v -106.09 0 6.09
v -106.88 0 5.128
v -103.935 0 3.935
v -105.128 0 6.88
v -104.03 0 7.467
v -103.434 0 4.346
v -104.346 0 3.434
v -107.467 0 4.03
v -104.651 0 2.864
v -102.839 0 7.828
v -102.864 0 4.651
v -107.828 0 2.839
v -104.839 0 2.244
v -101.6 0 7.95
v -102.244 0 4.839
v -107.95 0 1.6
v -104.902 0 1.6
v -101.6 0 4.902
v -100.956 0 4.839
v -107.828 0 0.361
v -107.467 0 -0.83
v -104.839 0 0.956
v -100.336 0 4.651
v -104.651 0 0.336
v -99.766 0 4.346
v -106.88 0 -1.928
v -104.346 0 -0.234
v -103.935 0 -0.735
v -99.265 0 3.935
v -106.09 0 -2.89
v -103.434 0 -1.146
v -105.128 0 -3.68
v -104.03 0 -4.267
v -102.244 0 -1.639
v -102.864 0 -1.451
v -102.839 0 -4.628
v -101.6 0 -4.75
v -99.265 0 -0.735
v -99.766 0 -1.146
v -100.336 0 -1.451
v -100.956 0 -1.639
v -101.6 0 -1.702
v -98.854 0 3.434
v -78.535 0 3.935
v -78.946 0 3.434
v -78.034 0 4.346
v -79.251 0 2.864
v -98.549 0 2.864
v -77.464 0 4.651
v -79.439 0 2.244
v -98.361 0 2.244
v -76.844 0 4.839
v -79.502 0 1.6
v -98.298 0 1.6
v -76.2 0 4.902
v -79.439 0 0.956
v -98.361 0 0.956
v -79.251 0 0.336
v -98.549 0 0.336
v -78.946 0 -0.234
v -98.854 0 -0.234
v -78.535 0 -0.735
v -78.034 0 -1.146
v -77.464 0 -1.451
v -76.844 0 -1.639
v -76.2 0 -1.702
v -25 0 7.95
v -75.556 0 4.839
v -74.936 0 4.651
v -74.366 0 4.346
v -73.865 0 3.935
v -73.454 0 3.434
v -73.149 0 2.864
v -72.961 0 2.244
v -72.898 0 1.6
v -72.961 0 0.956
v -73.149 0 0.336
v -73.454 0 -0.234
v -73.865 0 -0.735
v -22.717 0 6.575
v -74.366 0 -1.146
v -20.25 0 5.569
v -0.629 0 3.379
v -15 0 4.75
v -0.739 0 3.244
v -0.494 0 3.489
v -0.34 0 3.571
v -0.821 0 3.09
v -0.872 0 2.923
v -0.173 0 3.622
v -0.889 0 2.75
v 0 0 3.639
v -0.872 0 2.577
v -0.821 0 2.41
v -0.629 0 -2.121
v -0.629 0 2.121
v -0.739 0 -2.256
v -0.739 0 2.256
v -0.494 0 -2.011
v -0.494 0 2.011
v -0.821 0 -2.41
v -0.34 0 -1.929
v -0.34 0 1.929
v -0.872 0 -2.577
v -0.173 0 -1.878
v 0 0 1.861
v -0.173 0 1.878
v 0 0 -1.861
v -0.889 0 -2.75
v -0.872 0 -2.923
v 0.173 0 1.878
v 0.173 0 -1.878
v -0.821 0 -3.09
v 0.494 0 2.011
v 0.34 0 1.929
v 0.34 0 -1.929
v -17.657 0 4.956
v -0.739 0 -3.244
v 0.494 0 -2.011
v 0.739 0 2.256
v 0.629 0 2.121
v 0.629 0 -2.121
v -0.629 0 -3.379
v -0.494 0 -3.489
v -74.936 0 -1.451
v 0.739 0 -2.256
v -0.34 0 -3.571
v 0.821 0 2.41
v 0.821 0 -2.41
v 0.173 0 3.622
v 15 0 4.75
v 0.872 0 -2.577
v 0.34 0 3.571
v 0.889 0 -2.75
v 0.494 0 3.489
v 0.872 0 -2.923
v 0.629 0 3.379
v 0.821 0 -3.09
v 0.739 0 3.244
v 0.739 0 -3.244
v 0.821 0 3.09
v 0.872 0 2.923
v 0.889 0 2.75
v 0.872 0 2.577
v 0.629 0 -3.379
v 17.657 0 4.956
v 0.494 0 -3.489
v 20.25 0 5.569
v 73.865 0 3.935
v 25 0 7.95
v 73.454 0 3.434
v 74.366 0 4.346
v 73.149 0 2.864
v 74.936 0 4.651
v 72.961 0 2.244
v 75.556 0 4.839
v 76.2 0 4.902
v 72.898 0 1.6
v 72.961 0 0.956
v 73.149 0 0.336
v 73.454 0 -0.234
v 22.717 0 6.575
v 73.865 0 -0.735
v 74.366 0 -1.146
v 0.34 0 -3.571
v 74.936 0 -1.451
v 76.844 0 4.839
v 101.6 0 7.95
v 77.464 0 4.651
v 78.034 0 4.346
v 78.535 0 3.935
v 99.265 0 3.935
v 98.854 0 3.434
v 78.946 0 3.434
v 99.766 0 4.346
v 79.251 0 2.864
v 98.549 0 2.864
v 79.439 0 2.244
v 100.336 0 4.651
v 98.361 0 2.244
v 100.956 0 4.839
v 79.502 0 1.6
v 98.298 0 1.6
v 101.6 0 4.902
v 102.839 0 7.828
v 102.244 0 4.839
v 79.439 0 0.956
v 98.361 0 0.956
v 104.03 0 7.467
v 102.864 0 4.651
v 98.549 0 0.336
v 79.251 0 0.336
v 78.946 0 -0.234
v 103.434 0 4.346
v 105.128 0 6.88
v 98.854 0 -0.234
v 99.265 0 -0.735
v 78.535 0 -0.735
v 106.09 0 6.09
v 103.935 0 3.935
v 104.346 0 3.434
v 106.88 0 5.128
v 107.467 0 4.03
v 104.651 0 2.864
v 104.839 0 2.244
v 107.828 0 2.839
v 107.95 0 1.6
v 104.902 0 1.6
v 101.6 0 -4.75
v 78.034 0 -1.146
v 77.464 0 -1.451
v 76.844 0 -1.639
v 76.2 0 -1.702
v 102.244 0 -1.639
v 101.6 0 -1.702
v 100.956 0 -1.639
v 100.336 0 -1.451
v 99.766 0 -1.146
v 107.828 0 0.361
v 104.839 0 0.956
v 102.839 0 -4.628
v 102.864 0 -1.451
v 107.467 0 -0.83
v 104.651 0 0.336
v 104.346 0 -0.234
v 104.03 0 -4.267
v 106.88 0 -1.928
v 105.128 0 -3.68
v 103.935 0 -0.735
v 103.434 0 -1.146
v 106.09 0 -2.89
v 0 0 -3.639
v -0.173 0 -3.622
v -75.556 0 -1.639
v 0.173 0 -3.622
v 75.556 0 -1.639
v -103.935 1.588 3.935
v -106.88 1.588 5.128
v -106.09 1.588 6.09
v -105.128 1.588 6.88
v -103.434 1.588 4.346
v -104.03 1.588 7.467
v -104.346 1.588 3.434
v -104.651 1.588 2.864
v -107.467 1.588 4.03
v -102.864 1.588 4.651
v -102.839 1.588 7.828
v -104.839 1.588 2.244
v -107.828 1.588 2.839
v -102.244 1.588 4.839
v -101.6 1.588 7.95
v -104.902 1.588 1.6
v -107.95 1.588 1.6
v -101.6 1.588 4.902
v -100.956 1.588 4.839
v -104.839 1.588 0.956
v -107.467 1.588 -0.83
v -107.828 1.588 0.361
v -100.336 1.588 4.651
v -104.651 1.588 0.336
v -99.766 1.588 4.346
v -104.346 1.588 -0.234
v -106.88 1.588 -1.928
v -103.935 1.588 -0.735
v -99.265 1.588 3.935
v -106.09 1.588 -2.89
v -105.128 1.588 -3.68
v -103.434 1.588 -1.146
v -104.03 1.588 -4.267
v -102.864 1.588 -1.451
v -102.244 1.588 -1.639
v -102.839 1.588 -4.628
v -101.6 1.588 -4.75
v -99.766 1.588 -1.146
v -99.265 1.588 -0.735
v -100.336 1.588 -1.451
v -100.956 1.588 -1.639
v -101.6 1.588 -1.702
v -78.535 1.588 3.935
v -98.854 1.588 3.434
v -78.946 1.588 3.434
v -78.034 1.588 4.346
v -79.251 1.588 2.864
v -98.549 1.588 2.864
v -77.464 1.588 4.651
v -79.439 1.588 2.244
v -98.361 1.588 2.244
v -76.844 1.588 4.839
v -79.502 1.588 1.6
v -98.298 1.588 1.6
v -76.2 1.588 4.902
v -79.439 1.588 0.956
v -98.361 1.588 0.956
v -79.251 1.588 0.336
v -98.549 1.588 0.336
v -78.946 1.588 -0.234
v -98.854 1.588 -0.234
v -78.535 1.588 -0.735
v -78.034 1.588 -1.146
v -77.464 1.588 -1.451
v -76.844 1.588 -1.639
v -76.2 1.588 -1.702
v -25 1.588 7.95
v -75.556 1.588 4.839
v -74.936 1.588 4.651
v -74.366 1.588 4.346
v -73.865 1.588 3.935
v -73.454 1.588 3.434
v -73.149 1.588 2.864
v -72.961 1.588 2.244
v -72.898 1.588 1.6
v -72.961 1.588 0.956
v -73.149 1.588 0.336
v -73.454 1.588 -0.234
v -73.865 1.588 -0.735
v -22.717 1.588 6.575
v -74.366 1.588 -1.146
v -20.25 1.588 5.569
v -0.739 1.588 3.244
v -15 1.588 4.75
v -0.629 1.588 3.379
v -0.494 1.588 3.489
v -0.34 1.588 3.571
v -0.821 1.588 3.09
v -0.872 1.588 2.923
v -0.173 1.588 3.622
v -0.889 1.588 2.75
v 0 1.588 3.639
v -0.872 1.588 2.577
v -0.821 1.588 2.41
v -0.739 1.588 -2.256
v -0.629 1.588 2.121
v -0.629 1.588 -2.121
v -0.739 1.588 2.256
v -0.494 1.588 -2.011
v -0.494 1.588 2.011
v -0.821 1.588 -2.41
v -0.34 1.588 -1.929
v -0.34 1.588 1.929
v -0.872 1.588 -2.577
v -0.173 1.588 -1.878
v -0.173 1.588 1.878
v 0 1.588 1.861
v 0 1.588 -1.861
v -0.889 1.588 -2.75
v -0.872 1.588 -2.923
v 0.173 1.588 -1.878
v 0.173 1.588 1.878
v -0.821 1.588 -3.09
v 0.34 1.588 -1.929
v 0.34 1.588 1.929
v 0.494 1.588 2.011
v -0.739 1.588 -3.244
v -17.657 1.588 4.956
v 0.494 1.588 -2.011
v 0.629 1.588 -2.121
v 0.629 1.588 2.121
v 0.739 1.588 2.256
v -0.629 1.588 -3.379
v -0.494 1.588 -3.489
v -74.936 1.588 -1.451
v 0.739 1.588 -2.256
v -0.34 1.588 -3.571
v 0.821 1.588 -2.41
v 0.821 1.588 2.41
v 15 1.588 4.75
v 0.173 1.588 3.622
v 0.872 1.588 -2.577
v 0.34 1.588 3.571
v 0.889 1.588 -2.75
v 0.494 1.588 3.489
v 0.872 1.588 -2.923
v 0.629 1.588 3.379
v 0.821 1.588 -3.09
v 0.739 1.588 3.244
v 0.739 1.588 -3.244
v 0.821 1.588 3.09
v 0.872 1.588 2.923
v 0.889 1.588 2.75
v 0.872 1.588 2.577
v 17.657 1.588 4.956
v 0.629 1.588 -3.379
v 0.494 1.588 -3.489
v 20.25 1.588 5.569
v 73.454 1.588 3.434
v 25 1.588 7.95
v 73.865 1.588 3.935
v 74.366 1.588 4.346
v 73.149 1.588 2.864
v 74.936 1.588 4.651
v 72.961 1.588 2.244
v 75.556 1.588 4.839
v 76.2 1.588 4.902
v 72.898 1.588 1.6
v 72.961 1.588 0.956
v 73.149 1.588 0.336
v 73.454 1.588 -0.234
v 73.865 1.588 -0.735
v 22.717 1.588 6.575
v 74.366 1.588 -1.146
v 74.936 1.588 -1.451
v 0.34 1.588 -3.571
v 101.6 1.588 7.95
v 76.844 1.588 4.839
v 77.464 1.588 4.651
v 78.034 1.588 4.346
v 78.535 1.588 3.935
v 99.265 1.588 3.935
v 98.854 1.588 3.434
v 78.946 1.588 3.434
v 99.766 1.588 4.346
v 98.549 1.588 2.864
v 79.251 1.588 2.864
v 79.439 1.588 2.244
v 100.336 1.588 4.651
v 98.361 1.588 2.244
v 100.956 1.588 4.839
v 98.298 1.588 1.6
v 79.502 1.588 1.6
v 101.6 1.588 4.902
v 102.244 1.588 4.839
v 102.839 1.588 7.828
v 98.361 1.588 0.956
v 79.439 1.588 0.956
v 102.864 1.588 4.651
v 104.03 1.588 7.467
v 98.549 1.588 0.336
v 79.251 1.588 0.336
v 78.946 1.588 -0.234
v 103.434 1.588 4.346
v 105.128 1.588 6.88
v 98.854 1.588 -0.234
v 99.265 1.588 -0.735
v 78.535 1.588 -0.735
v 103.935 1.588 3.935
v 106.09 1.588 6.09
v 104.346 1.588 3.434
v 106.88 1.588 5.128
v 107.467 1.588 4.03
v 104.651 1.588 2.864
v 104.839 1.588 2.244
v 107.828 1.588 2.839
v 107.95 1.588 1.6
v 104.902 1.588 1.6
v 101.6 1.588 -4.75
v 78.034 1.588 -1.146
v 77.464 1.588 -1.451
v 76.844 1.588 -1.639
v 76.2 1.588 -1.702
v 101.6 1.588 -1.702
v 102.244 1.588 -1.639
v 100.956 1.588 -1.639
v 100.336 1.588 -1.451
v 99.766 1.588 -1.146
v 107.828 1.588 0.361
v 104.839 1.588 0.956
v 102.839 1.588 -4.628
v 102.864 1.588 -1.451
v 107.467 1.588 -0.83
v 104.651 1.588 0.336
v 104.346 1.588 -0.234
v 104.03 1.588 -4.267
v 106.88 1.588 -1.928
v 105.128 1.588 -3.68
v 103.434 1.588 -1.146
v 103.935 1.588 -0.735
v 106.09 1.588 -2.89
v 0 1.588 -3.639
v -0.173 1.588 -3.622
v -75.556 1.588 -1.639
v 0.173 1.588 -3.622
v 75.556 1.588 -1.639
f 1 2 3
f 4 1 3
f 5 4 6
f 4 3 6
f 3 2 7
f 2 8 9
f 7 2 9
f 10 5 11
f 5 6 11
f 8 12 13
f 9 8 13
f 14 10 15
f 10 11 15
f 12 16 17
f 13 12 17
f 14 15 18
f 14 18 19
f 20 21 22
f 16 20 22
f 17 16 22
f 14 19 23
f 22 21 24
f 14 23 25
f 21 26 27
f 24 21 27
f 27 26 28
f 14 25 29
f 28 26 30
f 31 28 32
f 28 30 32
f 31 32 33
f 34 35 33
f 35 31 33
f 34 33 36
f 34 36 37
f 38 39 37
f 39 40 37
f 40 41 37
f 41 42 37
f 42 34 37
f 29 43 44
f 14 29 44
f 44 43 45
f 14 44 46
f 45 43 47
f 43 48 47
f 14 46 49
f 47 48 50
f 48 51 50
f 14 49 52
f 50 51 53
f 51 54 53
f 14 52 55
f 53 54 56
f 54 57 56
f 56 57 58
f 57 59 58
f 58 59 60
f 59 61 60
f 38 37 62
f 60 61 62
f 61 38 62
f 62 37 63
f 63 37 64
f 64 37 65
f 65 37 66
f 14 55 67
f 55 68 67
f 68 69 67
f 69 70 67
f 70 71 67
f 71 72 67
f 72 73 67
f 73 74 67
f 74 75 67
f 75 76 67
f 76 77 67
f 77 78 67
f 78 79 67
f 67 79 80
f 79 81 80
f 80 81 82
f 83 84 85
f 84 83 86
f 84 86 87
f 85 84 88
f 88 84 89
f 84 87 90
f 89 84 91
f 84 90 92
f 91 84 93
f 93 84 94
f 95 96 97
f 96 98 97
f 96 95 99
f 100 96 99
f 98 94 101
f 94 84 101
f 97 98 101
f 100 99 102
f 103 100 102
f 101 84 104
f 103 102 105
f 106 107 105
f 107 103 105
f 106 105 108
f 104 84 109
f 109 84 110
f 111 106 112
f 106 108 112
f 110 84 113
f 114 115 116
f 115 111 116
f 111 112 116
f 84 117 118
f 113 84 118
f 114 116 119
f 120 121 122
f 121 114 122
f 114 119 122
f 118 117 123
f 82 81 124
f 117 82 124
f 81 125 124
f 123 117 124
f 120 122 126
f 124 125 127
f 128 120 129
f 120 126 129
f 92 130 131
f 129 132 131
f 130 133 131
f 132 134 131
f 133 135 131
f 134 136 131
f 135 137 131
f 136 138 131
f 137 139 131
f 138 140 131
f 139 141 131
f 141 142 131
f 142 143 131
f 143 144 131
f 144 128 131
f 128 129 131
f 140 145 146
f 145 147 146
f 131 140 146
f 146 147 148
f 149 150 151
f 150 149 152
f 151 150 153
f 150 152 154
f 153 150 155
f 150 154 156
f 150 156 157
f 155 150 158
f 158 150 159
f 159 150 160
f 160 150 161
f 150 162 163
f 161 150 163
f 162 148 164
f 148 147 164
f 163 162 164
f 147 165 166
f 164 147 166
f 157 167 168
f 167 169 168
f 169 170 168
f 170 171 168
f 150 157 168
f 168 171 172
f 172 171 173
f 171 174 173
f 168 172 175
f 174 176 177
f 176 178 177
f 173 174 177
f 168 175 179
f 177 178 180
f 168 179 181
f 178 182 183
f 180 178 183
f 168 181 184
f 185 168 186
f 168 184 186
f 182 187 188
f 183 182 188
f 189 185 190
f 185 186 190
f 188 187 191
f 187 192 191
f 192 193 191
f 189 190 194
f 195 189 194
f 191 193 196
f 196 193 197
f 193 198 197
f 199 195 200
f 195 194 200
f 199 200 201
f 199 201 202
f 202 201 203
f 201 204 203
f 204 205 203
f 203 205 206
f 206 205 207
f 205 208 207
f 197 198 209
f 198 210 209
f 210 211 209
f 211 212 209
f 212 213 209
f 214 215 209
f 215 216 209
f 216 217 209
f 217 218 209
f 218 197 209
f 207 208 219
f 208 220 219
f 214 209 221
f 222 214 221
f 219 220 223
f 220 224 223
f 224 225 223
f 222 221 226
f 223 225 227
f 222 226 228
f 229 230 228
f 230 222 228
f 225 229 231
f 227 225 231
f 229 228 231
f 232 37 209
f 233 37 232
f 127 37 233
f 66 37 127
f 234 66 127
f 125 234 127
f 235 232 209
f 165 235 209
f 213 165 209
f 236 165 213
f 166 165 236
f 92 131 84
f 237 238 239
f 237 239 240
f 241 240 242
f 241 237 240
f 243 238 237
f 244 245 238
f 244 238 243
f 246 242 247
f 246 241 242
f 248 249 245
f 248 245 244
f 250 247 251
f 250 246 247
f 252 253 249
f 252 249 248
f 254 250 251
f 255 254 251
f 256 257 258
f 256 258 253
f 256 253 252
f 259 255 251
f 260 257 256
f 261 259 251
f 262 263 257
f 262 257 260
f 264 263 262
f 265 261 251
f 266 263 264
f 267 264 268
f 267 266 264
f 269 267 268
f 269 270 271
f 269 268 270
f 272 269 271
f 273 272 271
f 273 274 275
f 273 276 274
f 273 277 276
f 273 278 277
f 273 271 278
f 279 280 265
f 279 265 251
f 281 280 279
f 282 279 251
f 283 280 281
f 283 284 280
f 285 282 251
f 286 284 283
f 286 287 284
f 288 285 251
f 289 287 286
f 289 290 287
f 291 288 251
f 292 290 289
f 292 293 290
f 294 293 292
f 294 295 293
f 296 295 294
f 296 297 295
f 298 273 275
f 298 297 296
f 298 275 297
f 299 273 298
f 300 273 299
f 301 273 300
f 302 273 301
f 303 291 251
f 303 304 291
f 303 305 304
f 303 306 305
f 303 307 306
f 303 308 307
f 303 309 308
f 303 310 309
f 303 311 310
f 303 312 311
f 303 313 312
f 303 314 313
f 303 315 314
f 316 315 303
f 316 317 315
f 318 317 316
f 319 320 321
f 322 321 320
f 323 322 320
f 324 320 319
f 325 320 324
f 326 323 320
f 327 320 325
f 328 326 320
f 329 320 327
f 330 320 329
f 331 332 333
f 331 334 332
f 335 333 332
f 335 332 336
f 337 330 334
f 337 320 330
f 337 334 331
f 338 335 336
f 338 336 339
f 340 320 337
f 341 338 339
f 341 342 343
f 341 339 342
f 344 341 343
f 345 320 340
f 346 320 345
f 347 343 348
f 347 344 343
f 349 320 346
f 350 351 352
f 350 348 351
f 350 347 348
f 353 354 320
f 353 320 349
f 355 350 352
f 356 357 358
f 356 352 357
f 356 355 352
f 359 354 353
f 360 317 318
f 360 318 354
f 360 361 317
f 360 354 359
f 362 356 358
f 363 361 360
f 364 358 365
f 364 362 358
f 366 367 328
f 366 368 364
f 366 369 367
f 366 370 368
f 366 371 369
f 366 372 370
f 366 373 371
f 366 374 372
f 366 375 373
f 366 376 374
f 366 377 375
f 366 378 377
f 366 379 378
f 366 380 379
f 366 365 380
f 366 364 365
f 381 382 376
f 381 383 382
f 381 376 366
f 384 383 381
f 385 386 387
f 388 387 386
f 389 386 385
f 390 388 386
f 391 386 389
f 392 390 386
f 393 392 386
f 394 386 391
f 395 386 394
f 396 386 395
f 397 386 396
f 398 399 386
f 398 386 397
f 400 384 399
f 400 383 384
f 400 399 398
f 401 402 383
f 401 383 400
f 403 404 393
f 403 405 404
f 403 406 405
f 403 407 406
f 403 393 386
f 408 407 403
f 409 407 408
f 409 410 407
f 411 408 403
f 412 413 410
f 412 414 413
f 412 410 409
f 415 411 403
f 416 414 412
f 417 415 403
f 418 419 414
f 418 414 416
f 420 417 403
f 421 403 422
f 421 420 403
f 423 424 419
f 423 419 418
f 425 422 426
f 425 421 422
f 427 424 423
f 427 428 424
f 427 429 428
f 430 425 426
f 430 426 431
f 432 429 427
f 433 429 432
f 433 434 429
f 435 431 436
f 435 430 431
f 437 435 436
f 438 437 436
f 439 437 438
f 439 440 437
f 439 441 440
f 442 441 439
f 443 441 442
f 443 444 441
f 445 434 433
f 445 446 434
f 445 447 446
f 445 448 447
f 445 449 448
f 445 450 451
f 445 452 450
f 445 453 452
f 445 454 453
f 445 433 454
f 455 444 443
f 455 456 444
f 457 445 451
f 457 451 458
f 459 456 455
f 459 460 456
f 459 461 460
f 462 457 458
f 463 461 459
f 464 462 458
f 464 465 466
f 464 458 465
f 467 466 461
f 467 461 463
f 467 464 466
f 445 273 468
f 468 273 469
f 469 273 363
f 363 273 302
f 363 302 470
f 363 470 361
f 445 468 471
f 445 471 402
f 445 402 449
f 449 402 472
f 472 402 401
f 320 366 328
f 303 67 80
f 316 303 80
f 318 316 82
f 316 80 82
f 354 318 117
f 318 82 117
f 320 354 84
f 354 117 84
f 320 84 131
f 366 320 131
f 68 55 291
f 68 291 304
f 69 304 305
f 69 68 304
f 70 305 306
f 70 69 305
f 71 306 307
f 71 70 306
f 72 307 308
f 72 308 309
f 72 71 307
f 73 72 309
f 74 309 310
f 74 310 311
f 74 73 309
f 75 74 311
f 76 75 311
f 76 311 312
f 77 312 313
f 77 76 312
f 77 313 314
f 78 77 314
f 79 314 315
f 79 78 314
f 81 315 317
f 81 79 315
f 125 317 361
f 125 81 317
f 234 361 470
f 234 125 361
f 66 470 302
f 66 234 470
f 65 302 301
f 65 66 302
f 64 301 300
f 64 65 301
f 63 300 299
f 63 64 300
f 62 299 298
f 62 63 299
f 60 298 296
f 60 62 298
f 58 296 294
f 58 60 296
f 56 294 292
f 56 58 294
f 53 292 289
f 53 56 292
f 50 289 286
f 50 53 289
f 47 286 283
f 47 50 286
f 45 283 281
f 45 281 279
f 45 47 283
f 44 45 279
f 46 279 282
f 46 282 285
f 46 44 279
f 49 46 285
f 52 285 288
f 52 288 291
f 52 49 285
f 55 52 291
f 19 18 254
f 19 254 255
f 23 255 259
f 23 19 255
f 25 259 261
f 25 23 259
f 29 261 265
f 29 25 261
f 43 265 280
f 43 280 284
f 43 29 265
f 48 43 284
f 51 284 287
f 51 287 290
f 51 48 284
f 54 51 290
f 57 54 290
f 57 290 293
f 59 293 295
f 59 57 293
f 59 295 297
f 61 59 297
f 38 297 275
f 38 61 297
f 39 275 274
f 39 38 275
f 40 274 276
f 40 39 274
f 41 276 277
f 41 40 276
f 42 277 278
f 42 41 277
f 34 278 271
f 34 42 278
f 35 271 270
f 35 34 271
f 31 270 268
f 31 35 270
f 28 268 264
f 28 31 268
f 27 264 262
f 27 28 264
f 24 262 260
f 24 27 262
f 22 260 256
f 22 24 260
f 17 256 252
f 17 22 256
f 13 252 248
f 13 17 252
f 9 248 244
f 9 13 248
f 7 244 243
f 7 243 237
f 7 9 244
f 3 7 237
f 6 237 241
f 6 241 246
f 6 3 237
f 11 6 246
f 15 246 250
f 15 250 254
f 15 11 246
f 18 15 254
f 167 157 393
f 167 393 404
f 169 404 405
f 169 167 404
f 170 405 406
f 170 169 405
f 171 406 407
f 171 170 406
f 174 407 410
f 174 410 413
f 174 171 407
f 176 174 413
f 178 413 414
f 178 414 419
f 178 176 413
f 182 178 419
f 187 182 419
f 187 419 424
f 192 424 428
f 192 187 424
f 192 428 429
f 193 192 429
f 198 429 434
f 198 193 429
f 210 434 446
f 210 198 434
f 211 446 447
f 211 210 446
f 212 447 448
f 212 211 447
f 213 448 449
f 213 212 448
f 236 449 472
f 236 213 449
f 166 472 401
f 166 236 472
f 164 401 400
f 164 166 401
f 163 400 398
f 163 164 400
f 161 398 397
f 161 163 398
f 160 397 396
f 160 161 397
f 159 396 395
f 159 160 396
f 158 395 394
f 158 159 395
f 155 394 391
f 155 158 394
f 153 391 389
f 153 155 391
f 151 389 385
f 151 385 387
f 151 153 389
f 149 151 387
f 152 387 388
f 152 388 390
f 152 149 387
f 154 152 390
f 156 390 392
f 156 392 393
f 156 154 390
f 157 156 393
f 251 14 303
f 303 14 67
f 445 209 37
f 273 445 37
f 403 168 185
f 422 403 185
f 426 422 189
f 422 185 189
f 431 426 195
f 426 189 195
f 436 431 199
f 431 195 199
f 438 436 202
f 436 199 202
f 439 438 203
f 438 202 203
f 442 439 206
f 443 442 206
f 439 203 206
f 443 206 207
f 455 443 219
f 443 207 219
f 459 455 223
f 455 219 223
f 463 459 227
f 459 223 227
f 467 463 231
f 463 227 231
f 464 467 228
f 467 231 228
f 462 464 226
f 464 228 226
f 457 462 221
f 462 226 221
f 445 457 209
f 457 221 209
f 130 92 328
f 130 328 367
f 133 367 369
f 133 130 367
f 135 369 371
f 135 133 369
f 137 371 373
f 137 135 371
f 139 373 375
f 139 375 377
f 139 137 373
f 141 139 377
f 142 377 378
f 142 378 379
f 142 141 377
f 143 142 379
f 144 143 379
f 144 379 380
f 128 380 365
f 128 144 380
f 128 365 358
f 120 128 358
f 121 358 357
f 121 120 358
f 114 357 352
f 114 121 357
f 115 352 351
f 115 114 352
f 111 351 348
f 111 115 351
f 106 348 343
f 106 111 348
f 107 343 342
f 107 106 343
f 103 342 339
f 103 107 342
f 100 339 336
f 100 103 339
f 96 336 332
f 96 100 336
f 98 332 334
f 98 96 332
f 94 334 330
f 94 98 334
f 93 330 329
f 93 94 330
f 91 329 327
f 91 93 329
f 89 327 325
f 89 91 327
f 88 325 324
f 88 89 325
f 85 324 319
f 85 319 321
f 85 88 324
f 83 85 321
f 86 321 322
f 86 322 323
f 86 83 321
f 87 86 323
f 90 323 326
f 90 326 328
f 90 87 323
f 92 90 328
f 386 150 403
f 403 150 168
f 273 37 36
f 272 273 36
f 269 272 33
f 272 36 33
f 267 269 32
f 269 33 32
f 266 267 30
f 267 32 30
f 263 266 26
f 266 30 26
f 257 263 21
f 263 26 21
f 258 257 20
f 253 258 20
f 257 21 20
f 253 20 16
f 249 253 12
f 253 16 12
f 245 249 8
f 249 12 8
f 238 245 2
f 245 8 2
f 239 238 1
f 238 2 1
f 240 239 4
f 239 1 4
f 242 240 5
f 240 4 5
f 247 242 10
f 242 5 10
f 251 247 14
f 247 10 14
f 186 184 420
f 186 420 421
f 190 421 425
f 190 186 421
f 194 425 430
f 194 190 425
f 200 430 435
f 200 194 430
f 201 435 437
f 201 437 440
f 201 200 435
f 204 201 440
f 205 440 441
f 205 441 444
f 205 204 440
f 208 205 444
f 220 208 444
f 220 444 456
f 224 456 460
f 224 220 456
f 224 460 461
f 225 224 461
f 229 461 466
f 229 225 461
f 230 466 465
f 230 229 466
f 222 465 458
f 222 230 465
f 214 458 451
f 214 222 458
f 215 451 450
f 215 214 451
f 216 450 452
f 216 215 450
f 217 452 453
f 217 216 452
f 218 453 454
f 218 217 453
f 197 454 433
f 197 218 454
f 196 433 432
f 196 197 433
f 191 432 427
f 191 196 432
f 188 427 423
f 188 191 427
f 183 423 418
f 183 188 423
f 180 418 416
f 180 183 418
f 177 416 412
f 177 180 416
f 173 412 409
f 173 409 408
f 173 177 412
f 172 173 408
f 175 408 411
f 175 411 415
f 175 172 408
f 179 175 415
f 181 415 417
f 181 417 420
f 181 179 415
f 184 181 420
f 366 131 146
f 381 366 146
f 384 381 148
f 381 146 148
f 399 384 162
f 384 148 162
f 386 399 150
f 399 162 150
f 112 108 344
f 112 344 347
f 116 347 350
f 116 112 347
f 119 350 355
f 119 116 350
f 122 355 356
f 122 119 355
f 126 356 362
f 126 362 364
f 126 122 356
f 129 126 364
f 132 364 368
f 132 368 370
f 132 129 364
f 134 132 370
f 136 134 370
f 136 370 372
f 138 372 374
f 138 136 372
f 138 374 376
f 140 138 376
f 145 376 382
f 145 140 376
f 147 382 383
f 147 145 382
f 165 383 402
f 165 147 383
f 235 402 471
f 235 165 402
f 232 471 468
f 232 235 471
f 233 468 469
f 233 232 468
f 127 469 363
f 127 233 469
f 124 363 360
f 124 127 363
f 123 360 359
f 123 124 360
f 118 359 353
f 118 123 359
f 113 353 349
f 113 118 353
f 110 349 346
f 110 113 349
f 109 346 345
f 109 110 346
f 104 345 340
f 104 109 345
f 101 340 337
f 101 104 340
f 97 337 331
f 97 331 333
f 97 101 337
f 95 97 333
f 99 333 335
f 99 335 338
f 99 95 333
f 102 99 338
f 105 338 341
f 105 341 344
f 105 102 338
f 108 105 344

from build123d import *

# Parameters (mm, degrees)
SKETCH5_R           = 3.302
SKETCH5_R_2         = 0.889
BOSS_EXTRUDE1_DEPTH = 1.5875


with BuildPart() as part:
    # Sketch5 → Boss-Extrude1 (new body)
    with BuildSketch(Plane(origin=(0, 0, 0), x_dir=(1, 0, 0), z_dir=(0, 1, 0))):
        with BuildLine():
            Line((101.6, 4.75), (-101.6, 4.75))
            ThreePointArc((-101.6, 4.75), (-107.95, -1.6), (-101.6, -7.95))
            Line((-101.6, -7.95), (-25, -7.95))
            ThreePointArc((-25, -7.95), (-20.249761899, -5.569494064), (-15, -4.75))
            Line((-15, -4.75), (15, -4.75))
            ThreePointArc((15, -4.75), (20.249761899, -5.569494064), (25, -7.95))
            Line((25, -7.95), (101.6, -7.95))
            ThreePointArc((101.6, -7.95), (107.95, -1.6), (101.6, 4.75))
        make_face()
        with Locations(Location((-101.6, -1.6, 0), (0, 0, 270))):
            Circle(SKETCH5_R, mode=Mode.SUBTRACT)
        with Locations(Location((0, 2.75, 0), (0, 0, 270))):
            Circle(SKETCH5_R_2, mode=Mode.SUBTRACT)
        with Locations(Location((101.6, -1.6, 0), (0, 0, 270))):
            Circle(SKETCH5_R, mode=Mode.SUBTRACT)
        with Locations(Location((0, -2.75, 0), (0, 0, 270))):
            Circle(SKETCH5_R_2, mode=Mode.SUBTRACT)
        with Locations(Location((-76.2, -1.6, 0), (0, 0, 270))):
            Circle(SKETCH5_R, mode=Mode.SUBTRACT)
        with Locations(Location((76.2, -1.6, 0), (0, 0, 270))):
            Circle(SKETCH5_R, mode=Mode.SUBTRACT)
    extrude(amount=BOSS_EXTRUDE1_DEPTH)


solid = part.part
